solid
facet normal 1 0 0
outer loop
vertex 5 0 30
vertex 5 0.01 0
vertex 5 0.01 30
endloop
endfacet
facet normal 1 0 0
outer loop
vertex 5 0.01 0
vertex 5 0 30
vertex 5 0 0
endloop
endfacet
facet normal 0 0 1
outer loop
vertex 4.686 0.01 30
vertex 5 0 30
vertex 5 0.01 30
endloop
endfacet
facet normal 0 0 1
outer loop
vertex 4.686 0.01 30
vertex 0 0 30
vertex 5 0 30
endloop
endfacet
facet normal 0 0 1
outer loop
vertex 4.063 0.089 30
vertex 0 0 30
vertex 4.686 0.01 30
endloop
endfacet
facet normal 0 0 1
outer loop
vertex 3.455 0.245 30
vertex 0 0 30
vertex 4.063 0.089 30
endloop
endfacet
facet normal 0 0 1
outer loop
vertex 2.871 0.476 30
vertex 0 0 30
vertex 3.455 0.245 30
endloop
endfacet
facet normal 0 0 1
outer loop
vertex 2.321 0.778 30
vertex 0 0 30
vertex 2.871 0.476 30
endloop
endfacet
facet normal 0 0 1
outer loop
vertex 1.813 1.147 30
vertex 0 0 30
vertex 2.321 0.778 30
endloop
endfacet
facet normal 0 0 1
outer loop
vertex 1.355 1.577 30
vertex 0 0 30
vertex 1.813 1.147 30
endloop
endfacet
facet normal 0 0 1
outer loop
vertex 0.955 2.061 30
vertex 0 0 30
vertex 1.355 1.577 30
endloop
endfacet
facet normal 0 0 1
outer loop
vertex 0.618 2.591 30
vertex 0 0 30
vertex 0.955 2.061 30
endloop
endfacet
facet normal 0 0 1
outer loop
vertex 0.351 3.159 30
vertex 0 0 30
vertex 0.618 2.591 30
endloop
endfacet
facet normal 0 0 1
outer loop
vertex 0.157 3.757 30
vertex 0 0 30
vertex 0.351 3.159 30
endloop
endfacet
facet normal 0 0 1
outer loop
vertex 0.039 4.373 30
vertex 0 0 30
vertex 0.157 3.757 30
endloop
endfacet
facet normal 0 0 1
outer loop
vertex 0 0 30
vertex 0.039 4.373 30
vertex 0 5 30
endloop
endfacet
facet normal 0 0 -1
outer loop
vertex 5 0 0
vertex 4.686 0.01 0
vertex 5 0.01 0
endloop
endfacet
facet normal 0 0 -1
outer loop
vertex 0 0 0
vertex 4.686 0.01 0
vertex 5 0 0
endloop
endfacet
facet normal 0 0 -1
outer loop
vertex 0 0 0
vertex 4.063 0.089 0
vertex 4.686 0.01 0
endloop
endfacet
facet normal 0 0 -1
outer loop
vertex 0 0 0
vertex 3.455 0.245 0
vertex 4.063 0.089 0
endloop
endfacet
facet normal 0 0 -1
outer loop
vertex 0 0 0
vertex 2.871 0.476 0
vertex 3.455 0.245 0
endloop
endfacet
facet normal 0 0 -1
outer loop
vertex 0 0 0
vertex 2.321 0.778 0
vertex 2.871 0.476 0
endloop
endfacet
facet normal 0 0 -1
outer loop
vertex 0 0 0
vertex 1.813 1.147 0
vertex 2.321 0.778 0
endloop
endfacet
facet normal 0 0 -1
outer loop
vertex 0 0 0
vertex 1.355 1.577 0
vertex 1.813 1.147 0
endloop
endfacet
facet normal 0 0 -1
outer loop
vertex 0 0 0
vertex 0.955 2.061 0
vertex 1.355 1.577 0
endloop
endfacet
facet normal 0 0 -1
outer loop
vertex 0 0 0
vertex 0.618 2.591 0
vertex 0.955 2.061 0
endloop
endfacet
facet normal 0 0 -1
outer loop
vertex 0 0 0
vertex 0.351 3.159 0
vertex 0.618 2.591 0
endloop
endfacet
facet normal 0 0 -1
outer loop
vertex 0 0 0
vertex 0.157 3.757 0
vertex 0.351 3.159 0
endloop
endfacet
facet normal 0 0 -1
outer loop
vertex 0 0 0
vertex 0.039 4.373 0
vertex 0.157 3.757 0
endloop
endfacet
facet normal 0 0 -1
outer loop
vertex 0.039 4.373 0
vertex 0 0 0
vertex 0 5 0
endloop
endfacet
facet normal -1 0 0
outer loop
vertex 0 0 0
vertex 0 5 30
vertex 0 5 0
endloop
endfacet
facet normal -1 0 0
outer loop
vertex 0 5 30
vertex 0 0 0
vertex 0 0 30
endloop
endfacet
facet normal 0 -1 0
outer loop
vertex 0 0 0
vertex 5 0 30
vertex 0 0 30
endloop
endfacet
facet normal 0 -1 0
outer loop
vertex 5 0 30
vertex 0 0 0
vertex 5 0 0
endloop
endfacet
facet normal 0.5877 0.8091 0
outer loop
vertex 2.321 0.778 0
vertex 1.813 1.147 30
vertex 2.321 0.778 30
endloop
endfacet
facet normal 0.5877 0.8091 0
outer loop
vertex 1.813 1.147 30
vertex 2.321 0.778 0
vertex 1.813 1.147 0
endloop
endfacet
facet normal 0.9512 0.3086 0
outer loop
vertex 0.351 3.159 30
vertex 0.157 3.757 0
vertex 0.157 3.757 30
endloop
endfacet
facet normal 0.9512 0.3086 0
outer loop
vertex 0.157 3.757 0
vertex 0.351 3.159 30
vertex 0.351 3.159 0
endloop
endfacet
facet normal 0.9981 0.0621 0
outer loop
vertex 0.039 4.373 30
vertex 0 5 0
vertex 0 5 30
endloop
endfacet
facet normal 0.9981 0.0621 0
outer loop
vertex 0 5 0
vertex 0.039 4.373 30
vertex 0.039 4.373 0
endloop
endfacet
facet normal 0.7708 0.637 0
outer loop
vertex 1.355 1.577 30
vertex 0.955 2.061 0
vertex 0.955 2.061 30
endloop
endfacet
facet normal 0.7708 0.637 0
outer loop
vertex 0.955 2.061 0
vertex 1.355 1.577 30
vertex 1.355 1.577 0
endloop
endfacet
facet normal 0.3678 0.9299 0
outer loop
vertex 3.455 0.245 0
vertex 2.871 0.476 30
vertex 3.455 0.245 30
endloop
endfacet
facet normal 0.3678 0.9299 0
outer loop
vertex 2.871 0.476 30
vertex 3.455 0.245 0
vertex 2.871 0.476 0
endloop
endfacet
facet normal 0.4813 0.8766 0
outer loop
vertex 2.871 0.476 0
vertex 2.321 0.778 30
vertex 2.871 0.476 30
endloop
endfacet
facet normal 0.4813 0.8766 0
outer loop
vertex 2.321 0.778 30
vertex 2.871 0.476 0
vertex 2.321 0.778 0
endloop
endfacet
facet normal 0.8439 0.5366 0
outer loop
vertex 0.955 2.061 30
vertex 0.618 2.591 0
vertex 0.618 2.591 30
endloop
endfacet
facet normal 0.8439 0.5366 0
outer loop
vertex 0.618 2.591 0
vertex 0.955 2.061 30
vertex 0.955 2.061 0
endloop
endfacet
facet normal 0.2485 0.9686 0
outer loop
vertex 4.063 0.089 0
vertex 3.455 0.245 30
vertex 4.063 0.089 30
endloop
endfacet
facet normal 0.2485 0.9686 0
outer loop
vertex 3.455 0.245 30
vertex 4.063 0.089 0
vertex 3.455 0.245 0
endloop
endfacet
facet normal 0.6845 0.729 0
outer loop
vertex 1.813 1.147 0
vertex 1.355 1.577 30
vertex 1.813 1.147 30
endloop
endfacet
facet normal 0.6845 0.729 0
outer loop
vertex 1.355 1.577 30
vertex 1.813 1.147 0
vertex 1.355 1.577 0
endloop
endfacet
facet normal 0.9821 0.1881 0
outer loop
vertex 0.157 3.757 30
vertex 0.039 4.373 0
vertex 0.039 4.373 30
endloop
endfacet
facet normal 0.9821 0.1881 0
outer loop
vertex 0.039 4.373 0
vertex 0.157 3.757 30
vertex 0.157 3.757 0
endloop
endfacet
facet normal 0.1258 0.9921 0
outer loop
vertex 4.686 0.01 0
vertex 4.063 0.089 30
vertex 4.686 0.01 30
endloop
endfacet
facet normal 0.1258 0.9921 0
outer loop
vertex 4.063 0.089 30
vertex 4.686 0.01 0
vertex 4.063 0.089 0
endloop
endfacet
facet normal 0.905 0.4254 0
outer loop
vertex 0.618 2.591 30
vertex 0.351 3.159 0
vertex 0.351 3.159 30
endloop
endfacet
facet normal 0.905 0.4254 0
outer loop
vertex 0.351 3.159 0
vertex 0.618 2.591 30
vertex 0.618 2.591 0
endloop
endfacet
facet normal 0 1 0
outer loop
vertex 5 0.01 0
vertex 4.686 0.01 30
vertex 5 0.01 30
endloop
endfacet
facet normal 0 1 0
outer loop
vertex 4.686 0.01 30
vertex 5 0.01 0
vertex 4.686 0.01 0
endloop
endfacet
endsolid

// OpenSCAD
// Fillet (or Round)
// Make a length of mini-crown molding.
// Add the molding to an object to make a fillet.
// Subtract the molding from an object to make a round.

// Defaults

gRes = 50;
gNudge = 0.01;

module Fillet(
	Dia,             // diameter
	Len,             // length
	Res = gRes,		// render resolution
	Nudge = gNudge)	// render error compensation
	{
	difference()
		{
		cube([Dia/2,Dia/2,Len]);
		translate([Dia/2,Dia/2,-Nudge])
		cylinder(d = Dia, h = Nudge+Len+Nudge, $fn = Res);
		}
	}

// Demo

Fillet(10,30);
